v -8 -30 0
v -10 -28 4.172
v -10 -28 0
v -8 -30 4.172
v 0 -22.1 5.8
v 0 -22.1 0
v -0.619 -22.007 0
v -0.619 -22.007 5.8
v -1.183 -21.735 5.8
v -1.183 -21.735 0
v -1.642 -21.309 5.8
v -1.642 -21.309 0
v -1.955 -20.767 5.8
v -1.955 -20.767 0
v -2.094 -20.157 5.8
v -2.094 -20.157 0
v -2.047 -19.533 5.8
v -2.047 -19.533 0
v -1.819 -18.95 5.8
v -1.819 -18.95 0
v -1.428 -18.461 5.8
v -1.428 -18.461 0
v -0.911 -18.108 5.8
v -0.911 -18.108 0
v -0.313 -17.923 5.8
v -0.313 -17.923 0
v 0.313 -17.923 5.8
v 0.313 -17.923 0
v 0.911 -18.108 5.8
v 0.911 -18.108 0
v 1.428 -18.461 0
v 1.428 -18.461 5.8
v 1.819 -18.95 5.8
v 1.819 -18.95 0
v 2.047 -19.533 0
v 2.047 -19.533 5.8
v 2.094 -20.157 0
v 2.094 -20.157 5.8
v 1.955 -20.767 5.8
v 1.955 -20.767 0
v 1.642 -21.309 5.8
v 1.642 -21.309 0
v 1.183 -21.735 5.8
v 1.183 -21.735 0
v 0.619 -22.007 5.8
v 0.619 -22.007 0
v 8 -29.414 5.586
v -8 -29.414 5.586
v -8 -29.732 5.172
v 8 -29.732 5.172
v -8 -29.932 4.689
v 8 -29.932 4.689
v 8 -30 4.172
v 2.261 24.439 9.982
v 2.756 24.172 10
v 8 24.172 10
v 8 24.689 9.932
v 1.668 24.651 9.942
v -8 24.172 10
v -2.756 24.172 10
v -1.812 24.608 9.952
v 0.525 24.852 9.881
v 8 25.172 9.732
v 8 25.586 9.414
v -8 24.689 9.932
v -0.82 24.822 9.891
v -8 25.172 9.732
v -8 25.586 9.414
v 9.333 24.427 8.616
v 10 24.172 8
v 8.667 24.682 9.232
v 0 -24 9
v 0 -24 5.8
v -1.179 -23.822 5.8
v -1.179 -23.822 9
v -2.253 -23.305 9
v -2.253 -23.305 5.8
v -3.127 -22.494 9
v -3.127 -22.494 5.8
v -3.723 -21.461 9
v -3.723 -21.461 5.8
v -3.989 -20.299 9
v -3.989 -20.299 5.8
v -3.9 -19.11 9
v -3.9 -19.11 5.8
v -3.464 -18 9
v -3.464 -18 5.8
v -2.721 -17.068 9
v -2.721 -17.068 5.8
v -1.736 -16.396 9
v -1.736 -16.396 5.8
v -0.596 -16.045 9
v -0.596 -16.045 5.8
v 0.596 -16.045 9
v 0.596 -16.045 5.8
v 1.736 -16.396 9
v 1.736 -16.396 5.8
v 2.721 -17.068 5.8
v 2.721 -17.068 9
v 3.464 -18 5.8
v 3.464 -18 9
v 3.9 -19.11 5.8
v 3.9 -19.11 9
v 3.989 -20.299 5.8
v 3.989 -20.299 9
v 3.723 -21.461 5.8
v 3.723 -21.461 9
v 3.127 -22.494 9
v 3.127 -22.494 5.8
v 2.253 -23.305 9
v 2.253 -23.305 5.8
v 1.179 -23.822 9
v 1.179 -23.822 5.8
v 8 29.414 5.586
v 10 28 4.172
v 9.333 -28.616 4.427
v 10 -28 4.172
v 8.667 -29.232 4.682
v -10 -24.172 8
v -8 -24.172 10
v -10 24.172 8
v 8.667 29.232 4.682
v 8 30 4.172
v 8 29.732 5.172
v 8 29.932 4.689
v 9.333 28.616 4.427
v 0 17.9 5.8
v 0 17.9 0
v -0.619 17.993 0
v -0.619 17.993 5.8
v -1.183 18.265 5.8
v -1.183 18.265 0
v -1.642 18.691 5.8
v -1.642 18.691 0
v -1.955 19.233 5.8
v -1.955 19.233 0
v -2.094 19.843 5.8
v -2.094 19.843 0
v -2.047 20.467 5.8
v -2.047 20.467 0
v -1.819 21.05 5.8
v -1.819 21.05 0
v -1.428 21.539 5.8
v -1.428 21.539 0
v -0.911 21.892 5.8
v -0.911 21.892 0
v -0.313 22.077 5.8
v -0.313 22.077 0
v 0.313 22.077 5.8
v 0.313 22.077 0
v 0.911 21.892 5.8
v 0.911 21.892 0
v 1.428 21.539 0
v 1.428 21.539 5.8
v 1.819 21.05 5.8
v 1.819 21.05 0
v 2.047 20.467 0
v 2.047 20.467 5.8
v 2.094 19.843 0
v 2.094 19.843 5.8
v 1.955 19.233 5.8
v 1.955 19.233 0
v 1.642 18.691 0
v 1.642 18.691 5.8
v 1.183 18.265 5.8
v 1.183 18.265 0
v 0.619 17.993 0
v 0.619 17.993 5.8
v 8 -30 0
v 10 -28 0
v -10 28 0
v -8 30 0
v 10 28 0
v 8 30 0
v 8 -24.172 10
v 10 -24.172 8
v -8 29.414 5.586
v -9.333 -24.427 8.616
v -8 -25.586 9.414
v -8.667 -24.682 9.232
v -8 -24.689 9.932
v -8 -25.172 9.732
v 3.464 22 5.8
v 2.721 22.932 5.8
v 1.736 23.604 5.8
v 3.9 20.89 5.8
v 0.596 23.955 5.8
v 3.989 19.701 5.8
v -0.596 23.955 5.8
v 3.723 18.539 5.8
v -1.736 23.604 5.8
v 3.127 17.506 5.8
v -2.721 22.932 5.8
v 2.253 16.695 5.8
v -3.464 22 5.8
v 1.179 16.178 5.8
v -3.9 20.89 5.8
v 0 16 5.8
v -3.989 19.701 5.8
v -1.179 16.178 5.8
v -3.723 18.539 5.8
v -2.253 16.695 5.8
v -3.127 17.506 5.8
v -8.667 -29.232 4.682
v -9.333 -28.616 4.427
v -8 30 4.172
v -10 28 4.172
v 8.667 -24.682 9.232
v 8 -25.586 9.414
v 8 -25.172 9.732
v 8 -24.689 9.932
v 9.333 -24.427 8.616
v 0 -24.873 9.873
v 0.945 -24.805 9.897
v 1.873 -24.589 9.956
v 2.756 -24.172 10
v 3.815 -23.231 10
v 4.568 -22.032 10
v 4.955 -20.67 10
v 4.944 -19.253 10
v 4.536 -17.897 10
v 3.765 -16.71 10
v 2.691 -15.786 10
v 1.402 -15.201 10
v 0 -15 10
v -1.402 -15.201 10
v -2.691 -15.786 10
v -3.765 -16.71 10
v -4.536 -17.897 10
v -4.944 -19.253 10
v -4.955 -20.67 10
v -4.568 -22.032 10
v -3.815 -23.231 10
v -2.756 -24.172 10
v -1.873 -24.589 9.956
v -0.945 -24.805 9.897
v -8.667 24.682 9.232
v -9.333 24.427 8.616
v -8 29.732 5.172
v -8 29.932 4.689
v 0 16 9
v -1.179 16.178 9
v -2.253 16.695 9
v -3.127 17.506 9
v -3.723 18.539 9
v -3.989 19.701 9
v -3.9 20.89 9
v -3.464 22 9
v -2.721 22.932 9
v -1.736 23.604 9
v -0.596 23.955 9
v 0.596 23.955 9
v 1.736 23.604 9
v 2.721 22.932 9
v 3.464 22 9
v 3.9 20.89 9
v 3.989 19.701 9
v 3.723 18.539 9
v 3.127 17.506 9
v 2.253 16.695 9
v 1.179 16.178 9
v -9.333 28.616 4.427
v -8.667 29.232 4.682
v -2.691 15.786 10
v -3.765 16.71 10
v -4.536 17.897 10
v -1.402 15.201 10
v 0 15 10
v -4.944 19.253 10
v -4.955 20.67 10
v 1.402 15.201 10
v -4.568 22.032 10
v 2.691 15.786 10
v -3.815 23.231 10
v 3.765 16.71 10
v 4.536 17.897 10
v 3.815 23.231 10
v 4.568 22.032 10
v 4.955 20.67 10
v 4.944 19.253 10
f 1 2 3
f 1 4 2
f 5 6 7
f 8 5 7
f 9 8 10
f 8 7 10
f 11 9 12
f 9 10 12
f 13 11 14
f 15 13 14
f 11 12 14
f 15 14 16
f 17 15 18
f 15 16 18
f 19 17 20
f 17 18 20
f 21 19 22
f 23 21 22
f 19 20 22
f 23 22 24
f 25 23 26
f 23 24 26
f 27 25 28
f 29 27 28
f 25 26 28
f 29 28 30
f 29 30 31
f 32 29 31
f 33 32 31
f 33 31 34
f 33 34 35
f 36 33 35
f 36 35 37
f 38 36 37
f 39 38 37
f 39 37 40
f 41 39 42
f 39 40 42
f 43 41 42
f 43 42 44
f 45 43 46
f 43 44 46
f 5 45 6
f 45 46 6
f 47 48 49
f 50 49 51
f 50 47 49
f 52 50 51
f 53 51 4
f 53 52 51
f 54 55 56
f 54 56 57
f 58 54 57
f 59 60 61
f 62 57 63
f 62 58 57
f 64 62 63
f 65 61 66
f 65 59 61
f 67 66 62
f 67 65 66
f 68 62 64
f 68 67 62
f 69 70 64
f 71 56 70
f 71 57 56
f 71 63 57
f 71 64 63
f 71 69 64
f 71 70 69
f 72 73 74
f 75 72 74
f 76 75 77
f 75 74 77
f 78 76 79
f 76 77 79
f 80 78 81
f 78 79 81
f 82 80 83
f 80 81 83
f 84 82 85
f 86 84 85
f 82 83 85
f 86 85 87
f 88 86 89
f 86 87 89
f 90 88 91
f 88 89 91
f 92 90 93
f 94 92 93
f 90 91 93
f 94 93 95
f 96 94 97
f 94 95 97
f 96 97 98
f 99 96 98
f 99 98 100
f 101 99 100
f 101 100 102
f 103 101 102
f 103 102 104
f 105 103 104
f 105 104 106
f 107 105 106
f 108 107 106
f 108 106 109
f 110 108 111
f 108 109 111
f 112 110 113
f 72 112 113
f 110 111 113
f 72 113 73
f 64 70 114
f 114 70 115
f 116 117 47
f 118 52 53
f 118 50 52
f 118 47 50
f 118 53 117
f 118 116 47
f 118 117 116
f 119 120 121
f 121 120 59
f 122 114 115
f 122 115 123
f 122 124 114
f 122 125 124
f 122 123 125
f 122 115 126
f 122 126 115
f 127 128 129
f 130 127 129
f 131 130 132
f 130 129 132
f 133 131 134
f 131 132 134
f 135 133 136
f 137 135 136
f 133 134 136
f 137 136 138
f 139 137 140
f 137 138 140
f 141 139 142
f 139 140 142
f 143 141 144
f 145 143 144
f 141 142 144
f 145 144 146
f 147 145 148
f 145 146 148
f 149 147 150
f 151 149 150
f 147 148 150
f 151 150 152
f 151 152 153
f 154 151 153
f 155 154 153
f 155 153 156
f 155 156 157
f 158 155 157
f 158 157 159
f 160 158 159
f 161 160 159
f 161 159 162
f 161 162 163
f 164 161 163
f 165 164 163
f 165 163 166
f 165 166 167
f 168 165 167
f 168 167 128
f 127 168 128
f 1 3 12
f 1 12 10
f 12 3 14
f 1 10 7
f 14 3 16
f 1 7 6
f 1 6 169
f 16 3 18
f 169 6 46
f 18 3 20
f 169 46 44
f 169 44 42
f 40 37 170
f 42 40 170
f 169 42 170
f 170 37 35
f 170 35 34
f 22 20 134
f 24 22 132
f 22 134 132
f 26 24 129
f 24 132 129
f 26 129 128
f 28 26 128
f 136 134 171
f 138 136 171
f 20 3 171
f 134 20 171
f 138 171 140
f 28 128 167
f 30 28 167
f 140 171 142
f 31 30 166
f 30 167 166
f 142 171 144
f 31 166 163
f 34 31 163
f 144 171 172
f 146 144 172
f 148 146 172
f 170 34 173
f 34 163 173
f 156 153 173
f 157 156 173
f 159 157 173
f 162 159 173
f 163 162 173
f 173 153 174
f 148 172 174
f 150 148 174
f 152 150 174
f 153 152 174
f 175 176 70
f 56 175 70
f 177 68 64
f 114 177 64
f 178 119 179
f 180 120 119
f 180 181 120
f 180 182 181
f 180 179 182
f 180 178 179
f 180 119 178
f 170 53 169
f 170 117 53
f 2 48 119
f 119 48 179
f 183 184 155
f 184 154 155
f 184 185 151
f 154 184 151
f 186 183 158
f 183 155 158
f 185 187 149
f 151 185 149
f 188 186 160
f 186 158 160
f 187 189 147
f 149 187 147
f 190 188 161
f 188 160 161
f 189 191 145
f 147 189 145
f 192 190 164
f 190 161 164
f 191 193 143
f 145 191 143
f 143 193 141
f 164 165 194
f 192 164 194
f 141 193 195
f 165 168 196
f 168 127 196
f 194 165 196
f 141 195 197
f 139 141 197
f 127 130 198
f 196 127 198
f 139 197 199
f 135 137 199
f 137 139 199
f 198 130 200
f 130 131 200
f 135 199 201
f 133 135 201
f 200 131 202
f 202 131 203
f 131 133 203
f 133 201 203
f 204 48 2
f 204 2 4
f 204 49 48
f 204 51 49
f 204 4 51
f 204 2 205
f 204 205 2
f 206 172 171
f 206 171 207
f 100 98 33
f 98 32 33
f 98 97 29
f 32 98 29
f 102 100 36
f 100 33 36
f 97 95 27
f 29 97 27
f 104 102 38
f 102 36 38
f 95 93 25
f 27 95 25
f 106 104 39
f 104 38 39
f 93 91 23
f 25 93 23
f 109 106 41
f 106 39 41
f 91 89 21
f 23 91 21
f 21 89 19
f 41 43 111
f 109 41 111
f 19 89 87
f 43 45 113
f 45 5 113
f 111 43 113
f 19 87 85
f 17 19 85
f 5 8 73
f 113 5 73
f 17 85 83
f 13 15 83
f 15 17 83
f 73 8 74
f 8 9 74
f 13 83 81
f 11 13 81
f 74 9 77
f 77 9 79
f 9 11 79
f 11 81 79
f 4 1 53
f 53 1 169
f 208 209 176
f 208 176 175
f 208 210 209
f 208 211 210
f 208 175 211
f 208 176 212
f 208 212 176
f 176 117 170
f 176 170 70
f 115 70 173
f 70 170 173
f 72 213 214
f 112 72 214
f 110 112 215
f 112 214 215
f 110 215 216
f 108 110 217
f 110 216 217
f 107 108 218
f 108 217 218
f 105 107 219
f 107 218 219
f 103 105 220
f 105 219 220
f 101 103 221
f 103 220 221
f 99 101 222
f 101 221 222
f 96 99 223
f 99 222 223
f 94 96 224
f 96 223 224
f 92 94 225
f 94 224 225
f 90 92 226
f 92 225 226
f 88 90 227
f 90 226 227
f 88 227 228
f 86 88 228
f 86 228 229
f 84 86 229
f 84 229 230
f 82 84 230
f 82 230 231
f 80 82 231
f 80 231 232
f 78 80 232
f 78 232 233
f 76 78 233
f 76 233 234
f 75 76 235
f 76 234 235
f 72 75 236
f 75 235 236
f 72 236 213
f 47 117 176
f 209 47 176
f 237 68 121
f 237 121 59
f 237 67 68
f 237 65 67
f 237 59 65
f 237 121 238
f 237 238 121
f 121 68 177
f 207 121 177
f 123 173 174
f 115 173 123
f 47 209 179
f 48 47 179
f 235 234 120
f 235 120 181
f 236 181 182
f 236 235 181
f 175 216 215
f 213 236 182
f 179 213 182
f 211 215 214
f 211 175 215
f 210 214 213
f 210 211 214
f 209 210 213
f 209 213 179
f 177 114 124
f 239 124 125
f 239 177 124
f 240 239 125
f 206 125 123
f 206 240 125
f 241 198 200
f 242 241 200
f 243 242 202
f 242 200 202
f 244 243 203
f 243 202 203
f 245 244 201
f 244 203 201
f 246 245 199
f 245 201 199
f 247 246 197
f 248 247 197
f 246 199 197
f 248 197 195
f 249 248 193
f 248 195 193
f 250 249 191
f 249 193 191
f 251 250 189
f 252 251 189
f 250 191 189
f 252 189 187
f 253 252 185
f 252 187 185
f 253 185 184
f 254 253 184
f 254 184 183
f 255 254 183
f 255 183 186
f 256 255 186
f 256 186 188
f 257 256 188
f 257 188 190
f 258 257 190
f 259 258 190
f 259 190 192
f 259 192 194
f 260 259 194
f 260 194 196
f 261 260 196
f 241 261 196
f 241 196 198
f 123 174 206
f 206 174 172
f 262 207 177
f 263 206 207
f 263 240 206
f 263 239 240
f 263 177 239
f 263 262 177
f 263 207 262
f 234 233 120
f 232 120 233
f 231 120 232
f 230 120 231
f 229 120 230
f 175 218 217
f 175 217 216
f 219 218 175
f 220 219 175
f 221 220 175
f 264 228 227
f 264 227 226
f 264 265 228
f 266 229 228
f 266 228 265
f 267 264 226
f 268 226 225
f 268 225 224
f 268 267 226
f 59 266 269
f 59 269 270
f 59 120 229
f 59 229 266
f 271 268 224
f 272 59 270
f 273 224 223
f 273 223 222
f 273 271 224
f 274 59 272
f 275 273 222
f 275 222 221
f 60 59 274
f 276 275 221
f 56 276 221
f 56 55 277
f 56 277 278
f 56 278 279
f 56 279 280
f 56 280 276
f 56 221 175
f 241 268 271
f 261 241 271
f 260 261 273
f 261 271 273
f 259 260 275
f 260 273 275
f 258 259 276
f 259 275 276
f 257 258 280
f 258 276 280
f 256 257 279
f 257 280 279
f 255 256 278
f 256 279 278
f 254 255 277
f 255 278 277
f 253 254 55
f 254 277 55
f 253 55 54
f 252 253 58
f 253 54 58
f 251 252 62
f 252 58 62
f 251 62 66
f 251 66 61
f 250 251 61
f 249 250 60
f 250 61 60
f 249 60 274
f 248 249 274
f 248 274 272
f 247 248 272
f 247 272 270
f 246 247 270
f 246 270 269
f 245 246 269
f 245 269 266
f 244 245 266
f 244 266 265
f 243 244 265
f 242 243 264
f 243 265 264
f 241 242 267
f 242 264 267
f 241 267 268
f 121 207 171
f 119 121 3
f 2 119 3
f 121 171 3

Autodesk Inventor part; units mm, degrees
ref_plane "YZ Plane" through (0, 0, 0) normal (1, 0, 0) x (0, 1, 0)
ref_plane "XZ Plane" through (0, 0, 0) normal (0, 1, 0) x (-1, 0, 0)
ref_plane "XY Plane" through (0, 0, 0) normal (0, 0, 1) x (1, 0, 0)
sketch "スケッチ1" plane through (0, 0, 0) normal (0, 0, 1) x (1, 0, 0)
  line L0 (-10, -30) -> (10, -30)
  line L1 (10, -30) -> (10, 30)
  line L2 (10, 30) -> (-10, 30)
  line L3 (-10, 30) -> (-10, -30)
  line L4 (-10, -30) -> (10, 30) construction
  line L5 (10, -30) -> (-10, 30) construction
  point P0 (0, 0)
  dimension "d0" = 20
  dimension "d1" = 60
extrude "押し出し1" add sketch "スケッチ1" along normal blind 10
chamfer "面取り1" distance 5 angle 45 2 edges at (0, 30, 10) (0, -30, 10)
fillet "フィレット1" radius 2 4 edges at (0, 30, 5) (0, 25, 10) (0, -25, 10) (0, -30, 5)
chamfer "面取り2" distance 2 angle 45 18 edges at (10, 0, 10) (10, 24.9369, 9.8478) (10, 27.5, 7.5) (10, 29.8478, 4.9369) (10, 30, 2.0858) (10, -24.9369, 9.8478) (10, -27.5, 7.5) (10, -29.8478, 4.9369) (10, -30, 2.0858) (-10, 0, 10) (-10, -24.9369, 9.8478) (-10, -27.5, 7.5) (-10, -29.8478, 4.9369) (-10, -30, 2.0858) (-10, 24.9369, 9.8478) (-10, 27.5, 7.5) (-10, 29.8478, 4.9369) (-10, 30, 2.0858)
sketch "スケッチ2" plane through (0, 0, 10) normal (0, 0, 1) x (1, 0, 0)
  line L0 (-8, -24.1716) -> (-8, 24.1716) projected
  line L1 (8, -24.1716) -> (-8, -24.1716) projected
  line L2 (8, 24.1716) -> (8, -24.1716) projected
  line L3 (-8, 24.1716) -> (8, 24.1716) projected
  point P0 (0, 0)
  point P1 (0, 20)
  point P2 (0, -20)
  dimension "d11" = 40
  dimension "d12" = 20
hole "穴1" at (0, 20, 10) at (0, -20, 10) direction (0, 0, -1) diameter 4.2 depth 21.5 counterbore diameter 8 counterbore depth 4.2
chamfer "面取り3" distance 1 angle 45 2 edges at (0, 24, 10) (0, -16, 10)
equation "\"d12\" = 0.5 * d11"
properties part number "Flame_Cover_A"
